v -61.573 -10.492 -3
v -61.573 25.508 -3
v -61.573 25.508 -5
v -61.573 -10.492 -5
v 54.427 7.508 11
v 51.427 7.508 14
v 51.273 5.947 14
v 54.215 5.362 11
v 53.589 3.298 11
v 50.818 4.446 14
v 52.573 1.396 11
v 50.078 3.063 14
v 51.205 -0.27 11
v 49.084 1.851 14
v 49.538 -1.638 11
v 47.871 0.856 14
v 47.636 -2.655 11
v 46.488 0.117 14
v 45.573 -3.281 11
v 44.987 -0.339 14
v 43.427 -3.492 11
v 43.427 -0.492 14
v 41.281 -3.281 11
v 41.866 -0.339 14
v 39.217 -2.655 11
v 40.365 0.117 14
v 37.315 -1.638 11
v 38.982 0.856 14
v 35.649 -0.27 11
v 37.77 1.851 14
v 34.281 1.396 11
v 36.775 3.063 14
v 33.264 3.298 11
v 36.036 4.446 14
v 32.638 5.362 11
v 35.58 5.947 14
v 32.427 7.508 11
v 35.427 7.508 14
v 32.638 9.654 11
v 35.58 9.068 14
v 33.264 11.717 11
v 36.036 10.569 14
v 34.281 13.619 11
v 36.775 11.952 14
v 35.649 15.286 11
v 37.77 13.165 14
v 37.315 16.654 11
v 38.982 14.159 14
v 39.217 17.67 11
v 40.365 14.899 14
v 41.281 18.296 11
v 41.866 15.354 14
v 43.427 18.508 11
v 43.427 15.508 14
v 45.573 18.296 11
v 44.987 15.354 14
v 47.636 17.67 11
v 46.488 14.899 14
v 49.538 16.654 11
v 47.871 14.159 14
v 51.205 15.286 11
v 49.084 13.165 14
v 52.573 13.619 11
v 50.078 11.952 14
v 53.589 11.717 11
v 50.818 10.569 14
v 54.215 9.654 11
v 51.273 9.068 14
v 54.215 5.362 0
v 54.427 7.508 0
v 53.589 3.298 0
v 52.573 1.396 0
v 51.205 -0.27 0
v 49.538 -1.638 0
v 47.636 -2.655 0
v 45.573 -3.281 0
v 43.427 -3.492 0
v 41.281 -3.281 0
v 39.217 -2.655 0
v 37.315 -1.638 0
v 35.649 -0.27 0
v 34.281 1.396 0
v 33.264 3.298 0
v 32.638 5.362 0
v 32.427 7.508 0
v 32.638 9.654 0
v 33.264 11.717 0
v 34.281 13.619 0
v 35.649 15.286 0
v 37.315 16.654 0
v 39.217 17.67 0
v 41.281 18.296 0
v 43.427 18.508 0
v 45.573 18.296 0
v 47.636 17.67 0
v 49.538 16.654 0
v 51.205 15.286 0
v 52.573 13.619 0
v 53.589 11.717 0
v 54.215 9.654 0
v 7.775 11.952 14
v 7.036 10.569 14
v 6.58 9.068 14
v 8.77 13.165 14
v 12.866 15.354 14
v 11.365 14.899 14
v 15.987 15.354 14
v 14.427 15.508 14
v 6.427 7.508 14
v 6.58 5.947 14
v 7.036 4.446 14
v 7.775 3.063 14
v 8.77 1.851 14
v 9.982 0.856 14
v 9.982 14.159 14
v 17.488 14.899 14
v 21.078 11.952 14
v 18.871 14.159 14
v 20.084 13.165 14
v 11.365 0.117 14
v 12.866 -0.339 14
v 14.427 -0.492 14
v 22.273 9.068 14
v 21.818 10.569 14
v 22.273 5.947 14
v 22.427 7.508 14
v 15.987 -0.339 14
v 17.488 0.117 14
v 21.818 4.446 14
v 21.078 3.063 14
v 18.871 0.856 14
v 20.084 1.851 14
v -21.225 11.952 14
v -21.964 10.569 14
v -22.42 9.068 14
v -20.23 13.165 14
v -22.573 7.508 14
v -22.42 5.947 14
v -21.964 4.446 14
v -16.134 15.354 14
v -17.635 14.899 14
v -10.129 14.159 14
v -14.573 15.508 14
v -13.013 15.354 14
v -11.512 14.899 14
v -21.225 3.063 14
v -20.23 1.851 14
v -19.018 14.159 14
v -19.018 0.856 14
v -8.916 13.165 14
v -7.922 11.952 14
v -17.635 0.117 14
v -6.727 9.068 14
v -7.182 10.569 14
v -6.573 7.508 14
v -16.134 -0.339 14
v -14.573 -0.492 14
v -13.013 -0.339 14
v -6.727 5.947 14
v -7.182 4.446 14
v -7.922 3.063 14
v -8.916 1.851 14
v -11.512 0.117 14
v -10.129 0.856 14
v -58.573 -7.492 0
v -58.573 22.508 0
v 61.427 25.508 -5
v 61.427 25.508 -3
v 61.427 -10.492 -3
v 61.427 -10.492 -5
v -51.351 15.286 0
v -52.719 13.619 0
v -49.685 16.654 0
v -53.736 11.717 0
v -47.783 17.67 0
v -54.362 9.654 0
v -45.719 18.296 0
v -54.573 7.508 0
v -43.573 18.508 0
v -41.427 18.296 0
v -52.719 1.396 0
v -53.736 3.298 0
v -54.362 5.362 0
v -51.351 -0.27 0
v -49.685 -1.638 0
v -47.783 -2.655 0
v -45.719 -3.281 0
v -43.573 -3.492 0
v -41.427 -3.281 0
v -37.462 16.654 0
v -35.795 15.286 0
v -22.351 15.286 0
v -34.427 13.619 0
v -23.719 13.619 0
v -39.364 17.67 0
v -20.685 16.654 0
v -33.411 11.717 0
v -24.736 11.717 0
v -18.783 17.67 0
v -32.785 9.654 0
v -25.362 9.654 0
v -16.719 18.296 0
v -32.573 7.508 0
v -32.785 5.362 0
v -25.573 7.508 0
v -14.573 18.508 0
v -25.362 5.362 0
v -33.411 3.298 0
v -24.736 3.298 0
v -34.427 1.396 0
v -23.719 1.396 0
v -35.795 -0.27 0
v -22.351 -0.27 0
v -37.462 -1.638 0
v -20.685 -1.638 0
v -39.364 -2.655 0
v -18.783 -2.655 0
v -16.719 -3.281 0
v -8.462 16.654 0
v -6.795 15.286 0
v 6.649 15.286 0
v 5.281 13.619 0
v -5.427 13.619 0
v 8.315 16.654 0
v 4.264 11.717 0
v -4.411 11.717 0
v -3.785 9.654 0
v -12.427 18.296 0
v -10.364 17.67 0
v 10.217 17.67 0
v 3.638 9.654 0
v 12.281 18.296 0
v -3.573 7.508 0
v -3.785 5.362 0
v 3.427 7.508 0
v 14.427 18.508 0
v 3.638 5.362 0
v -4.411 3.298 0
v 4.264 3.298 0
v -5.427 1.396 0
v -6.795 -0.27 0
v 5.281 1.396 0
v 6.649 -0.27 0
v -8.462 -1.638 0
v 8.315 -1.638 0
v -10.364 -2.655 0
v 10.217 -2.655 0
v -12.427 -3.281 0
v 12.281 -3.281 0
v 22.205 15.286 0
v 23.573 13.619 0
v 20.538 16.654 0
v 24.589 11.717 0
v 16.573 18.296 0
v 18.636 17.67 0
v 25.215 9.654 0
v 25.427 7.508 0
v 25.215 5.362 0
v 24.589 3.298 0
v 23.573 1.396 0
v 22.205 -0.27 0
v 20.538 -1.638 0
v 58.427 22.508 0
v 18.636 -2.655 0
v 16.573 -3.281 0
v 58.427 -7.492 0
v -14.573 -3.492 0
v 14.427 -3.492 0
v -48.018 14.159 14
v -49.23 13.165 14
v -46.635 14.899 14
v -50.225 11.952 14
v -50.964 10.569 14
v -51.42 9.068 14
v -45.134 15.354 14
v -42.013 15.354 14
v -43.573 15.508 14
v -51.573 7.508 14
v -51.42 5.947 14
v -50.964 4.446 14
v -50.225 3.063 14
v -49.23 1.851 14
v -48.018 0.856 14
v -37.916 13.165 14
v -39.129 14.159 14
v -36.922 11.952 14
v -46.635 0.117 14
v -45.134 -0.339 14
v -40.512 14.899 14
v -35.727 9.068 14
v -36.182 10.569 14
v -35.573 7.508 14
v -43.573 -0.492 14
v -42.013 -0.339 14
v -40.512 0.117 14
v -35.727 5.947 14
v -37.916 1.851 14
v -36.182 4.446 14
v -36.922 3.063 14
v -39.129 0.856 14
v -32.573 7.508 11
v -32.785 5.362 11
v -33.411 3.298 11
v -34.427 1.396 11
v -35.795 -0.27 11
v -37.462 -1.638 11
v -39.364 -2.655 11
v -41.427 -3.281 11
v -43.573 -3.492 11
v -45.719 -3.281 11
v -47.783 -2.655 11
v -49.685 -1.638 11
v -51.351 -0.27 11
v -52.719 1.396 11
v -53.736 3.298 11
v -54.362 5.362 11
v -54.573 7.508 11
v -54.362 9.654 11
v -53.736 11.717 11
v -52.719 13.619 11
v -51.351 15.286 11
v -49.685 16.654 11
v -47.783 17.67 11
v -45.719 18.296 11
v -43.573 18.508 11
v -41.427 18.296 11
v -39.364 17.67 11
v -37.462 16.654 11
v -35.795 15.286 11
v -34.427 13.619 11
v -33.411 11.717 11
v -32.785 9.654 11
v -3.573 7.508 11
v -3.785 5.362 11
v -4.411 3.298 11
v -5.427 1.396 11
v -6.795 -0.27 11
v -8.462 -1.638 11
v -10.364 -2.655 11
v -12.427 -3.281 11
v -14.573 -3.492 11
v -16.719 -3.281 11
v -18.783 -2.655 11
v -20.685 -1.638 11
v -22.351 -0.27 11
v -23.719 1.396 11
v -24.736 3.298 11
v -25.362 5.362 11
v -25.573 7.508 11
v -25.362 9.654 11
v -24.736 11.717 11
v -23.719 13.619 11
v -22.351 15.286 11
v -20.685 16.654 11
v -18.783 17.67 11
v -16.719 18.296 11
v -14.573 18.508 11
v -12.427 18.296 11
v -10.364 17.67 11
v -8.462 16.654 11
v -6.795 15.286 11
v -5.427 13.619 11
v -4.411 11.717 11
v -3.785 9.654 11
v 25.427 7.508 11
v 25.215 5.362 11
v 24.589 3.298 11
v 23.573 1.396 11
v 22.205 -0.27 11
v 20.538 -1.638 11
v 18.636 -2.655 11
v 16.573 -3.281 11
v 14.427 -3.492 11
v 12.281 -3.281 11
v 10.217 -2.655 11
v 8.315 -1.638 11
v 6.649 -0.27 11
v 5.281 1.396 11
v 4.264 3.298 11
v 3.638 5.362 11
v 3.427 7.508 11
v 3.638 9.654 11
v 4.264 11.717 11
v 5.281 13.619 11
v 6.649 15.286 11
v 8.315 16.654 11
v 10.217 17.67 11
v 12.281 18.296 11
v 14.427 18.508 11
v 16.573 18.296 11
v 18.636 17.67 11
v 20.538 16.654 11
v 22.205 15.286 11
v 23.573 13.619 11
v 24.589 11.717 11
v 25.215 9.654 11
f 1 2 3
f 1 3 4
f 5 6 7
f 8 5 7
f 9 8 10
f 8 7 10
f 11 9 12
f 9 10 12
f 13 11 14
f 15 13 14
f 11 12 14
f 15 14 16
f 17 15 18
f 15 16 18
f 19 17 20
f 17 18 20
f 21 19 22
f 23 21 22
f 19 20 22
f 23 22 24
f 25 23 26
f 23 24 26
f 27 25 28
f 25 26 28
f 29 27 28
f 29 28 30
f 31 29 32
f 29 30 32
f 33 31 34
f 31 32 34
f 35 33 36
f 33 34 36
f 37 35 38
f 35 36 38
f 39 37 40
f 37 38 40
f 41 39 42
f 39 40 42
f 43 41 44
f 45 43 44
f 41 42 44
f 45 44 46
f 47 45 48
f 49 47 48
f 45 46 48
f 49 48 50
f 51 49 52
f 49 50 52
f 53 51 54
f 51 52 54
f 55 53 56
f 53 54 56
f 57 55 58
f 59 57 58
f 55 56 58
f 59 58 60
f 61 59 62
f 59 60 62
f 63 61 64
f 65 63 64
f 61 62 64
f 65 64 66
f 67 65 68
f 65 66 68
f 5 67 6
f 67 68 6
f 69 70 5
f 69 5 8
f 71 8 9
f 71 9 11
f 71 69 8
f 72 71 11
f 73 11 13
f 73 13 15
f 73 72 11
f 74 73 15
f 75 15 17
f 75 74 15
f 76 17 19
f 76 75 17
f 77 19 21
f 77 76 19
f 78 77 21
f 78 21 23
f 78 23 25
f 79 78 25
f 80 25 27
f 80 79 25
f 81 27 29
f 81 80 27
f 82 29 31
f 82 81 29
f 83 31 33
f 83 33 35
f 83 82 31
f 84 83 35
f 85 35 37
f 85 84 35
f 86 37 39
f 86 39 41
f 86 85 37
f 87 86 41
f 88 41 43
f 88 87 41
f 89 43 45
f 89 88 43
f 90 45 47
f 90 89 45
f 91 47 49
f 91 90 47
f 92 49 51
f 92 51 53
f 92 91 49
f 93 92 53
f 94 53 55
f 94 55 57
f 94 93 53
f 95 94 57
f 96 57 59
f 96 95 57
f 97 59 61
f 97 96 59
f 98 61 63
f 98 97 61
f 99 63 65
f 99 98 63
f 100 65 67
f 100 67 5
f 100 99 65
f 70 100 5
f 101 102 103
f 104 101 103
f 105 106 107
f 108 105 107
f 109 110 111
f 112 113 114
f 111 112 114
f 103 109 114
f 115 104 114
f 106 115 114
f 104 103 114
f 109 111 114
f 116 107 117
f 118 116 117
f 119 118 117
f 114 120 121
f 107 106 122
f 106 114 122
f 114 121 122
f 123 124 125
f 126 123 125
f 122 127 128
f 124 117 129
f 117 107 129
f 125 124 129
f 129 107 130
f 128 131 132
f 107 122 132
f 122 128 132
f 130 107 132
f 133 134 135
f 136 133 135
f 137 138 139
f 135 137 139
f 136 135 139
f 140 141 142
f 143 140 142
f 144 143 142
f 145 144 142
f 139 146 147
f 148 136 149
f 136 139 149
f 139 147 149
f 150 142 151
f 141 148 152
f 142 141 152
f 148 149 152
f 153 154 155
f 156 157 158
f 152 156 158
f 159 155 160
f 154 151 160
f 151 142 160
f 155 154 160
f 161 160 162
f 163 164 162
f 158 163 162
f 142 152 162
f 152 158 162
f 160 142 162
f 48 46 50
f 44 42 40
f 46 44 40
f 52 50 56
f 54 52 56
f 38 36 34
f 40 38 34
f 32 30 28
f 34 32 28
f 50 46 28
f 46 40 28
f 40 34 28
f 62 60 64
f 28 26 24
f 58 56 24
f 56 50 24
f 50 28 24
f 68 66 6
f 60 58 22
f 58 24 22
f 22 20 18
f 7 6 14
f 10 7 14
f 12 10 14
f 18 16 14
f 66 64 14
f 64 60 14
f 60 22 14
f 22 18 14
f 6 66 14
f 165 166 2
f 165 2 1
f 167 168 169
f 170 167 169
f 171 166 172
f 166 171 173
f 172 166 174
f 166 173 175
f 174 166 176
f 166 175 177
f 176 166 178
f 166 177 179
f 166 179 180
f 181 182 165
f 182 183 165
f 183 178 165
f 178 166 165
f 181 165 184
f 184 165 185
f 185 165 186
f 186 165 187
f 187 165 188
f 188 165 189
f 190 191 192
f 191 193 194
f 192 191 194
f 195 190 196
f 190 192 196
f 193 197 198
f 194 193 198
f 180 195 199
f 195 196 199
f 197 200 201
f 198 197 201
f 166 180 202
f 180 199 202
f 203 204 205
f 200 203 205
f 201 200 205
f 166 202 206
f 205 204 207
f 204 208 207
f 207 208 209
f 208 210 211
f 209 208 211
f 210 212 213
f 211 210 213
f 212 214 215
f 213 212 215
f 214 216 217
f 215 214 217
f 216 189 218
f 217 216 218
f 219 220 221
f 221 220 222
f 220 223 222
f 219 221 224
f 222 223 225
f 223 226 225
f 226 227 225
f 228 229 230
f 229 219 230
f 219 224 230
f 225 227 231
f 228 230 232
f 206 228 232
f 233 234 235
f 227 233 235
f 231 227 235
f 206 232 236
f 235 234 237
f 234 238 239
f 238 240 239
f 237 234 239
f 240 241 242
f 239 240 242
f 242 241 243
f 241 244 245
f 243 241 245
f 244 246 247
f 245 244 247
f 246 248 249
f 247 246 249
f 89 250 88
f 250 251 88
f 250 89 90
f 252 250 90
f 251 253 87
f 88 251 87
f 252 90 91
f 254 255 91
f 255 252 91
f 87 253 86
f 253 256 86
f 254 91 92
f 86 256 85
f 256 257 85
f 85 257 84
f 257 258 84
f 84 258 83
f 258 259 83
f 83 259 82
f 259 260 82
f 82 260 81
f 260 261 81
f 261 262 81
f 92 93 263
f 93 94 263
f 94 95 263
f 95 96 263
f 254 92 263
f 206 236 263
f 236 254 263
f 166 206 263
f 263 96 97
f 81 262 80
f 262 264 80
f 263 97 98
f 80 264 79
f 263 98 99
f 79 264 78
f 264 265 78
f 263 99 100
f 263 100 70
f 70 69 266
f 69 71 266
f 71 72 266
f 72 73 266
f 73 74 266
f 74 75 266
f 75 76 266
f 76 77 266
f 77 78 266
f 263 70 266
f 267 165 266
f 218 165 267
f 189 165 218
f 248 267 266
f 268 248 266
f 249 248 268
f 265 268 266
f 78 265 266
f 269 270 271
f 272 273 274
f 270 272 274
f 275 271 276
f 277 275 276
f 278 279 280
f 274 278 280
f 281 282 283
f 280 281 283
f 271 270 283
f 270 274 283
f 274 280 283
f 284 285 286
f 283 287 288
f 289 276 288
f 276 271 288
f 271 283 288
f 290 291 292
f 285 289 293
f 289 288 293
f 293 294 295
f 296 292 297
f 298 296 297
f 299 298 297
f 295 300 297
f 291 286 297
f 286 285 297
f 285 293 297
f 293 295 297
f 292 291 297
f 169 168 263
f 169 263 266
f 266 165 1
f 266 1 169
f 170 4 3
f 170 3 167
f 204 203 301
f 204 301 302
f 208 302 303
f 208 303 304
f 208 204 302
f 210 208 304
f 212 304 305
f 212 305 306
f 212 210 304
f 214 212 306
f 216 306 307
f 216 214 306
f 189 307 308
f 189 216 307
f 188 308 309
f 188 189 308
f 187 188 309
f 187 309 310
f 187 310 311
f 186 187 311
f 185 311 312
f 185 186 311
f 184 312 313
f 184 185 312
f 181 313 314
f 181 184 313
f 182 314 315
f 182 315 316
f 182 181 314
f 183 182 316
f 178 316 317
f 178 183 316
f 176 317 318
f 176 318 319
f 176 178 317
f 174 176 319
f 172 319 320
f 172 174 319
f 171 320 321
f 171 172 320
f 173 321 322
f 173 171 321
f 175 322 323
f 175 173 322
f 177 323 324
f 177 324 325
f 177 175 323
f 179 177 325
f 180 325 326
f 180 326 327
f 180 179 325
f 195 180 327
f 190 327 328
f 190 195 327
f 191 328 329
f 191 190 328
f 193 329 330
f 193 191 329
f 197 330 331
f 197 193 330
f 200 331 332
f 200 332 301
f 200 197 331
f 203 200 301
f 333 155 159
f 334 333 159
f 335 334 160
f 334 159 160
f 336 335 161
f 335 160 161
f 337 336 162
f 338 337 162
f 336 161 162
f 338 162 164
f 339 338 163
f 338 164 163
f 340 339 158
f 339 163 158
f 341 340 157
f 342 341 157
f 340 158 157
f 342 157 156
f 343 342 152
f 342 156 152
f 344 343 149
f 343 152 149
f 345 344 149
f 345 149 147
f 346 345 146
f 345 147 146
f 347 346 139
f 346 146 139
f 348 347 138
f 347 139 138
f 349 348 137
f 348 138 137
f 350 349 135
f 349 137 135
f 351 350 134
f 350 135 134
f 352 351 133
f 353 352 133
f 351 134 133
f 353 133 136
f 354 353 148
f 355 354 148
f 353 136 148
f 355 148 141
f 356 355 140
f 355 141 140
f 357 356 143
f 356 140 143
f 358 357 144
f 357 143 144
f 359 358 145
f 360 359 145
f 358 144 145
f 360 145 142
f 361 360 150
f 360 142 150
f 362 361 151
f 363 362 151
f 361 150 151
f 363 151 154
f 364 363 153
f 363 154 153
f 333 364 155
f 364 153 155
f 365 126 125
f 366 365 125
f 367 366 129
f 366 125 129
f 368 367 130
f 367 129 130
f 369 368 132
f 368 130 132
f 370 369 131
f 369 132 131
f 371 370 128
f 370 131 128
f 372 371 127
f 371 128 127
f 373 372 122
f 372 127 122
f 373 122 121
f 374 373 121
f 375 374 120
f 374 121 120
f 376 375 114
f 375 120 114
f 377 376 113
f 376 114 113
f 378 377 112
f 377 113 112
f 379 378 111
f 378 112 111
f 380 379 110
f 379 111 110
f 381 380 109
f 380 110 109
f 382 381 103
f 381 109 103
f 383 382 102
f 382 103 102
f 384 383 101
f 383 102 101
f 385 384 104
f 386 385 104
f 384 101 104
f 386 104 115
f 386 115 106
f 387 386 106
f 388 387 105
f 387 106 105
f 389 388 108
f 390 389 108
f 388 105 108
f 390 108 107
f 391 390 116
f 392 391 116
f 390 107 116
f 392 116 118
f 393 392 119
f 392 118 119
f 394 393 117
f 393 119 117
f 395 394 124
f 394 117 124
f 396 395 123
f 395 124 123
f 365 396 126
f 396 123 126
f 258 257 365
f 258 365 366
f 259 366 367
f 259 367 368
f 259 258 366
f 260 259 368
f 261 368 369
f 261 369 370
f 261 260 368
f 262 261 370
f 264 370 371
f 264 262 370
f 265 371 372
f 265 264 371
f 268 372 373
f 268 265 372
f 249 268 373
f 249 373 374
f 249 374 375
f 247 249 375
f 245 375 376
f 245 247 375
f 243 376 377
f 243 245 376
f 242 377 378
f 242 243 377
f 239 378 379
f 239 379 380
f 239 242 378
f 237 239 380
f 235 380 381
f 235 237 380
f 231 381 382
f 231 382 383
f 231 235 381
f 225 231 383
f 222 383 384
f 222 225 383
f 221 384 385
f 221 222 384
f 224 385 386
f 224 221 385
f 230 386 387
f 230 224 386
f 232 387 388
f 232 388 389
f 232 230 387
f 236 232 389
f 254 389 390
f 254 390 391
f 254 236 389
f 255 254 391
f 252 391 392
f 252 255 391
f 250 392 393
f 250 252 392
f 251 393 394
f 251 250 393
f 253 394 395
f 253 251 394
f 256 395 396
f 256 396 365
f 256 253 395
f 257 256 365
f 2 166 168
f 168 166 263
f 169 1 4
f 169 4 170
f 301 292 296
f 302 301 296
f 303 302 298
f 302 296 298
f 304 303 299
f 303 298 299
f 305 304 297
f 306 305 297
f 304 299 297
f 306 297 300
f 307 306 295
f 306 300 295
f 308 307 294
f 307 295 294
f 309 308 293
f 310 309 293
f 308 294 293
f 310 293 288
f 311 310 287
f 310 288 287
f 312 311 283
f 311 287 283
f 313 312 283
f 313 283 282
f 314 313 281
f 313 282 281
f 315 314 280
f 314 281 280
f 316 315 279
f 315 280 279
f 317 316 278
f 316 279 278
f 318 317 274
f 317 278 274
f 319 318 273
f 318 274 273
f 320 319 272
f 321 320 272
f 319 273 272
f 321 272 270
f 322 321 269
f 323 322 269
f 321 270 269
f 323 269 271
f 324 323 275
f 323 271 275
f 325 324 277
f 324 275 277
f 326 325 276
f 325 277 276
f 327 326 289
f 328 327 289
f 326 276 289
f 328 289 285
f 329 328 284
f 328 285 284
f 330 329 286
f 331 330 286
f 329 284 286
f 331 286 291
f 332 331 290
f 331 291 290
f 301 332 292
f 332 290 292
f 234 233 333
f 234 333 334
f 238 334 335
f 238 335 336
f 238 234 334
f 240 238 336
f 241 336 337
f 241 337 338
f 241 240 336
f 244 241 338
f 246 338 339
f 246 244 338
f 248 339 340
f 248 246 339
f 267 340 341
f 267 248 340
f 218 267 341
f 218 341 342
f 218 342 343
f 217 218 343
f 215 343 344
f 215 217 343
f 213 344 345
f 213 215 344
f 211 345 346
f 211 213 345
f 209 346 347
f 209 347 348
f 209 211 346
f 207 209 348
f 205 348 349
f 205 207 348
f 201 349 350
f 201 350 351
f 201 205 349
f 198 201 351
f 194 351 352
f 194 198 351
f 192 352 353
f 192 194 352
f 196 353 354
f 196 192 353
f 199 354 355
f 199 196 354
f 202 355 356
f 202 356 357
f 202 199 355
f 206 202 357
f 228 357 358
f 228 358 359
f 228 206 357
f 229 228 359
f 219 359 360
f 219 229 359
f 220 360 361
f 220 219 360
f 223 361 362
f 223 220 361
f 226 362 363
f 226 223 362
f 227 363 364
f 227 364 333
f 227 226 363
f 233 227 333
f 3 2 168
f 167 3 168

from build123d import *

# Parameters (mm, degrees)
F0_W     = 123
F0_H     = 36
F0_R     = 11
F1_DEPTH = 5
F2_DEPTH = 14
F3_SIZE  = 3
F4_ANGLE = 180


with BuildPart() as f1:
    # F0 (on Top) → F1 (new body)
    with BuildSketch(Plane.XY):
        with Locations((-0.073285, 7.507721)):
            Rectangle(F0_W, F0_H)
        with Locations((-43.573285, 7.507721)):
            Circle(F0_R, mode=Mode.SUBTRACT)
        with Locations((-14.573285, 7.507721)):
            Circle(F0_R, mode=Mode.SUBTRACT)
        with Locations((14.426715, 7.507721)):
            Circle(F0_R, mode=Mode.SUBTRACT)
        with Locations((43.426715, 7.507721)):
            Circle(F0_R, mode=Mode.SUBTRACT)
        with Locations((-43.573285, 7.507721)):
            Circle(F0_R)
        with Locations((-14.573285, 7.507721)):
            Circle(F0_R)
        with Locations((14.426715, 7.507721)):
            Circle(F0_R)
        with Locations((43.426715, 7.507721)):
            Circle(F0_R)
    extrude(amount=F1_DEPTH)

    # F0 (on Top) → F2 (join)
    with BuildSketch(Plane.XY):
        with Locations((-43.573285, 7.507721)):
            Circle(F0_R)
        with Locations((-14.573285, 7.507721)):
            Circle(F0_R)
        with Locations((14.426715, 7.507721)):
            Circle(F0_R)
        with Locations((43.426715, 7.507721)):
            Circle(F0_R)
    extrude(amount=-F2_DEPTH)

    # F3
    f3_edges = [f1.edges().sort_by_distance(p)[0] for p in [
        (-0.073285, 25.507721, 0),
        (-61.573285, 7.507721, 0),
        (61.426715, 7.507721, 0),
        (-0.073285, -10.492279, 0),
        (32.426715, 7.507721, -14),
        (3.426715, 7.507721, -14),
        (-25.573285, 7.507721, -14),
        (-54.573285, 7.507721, -14),
    ]]
    chamfer(f3_edges, length=F3_SIZE)


with BuildPart() as f1_1:
    # F4: moved
    add(f1.part.rotate(Axis((-0.073285, 7.507721, 0), (1, 0, 0)), F4_ANGLE))


solid = f1_1.part
